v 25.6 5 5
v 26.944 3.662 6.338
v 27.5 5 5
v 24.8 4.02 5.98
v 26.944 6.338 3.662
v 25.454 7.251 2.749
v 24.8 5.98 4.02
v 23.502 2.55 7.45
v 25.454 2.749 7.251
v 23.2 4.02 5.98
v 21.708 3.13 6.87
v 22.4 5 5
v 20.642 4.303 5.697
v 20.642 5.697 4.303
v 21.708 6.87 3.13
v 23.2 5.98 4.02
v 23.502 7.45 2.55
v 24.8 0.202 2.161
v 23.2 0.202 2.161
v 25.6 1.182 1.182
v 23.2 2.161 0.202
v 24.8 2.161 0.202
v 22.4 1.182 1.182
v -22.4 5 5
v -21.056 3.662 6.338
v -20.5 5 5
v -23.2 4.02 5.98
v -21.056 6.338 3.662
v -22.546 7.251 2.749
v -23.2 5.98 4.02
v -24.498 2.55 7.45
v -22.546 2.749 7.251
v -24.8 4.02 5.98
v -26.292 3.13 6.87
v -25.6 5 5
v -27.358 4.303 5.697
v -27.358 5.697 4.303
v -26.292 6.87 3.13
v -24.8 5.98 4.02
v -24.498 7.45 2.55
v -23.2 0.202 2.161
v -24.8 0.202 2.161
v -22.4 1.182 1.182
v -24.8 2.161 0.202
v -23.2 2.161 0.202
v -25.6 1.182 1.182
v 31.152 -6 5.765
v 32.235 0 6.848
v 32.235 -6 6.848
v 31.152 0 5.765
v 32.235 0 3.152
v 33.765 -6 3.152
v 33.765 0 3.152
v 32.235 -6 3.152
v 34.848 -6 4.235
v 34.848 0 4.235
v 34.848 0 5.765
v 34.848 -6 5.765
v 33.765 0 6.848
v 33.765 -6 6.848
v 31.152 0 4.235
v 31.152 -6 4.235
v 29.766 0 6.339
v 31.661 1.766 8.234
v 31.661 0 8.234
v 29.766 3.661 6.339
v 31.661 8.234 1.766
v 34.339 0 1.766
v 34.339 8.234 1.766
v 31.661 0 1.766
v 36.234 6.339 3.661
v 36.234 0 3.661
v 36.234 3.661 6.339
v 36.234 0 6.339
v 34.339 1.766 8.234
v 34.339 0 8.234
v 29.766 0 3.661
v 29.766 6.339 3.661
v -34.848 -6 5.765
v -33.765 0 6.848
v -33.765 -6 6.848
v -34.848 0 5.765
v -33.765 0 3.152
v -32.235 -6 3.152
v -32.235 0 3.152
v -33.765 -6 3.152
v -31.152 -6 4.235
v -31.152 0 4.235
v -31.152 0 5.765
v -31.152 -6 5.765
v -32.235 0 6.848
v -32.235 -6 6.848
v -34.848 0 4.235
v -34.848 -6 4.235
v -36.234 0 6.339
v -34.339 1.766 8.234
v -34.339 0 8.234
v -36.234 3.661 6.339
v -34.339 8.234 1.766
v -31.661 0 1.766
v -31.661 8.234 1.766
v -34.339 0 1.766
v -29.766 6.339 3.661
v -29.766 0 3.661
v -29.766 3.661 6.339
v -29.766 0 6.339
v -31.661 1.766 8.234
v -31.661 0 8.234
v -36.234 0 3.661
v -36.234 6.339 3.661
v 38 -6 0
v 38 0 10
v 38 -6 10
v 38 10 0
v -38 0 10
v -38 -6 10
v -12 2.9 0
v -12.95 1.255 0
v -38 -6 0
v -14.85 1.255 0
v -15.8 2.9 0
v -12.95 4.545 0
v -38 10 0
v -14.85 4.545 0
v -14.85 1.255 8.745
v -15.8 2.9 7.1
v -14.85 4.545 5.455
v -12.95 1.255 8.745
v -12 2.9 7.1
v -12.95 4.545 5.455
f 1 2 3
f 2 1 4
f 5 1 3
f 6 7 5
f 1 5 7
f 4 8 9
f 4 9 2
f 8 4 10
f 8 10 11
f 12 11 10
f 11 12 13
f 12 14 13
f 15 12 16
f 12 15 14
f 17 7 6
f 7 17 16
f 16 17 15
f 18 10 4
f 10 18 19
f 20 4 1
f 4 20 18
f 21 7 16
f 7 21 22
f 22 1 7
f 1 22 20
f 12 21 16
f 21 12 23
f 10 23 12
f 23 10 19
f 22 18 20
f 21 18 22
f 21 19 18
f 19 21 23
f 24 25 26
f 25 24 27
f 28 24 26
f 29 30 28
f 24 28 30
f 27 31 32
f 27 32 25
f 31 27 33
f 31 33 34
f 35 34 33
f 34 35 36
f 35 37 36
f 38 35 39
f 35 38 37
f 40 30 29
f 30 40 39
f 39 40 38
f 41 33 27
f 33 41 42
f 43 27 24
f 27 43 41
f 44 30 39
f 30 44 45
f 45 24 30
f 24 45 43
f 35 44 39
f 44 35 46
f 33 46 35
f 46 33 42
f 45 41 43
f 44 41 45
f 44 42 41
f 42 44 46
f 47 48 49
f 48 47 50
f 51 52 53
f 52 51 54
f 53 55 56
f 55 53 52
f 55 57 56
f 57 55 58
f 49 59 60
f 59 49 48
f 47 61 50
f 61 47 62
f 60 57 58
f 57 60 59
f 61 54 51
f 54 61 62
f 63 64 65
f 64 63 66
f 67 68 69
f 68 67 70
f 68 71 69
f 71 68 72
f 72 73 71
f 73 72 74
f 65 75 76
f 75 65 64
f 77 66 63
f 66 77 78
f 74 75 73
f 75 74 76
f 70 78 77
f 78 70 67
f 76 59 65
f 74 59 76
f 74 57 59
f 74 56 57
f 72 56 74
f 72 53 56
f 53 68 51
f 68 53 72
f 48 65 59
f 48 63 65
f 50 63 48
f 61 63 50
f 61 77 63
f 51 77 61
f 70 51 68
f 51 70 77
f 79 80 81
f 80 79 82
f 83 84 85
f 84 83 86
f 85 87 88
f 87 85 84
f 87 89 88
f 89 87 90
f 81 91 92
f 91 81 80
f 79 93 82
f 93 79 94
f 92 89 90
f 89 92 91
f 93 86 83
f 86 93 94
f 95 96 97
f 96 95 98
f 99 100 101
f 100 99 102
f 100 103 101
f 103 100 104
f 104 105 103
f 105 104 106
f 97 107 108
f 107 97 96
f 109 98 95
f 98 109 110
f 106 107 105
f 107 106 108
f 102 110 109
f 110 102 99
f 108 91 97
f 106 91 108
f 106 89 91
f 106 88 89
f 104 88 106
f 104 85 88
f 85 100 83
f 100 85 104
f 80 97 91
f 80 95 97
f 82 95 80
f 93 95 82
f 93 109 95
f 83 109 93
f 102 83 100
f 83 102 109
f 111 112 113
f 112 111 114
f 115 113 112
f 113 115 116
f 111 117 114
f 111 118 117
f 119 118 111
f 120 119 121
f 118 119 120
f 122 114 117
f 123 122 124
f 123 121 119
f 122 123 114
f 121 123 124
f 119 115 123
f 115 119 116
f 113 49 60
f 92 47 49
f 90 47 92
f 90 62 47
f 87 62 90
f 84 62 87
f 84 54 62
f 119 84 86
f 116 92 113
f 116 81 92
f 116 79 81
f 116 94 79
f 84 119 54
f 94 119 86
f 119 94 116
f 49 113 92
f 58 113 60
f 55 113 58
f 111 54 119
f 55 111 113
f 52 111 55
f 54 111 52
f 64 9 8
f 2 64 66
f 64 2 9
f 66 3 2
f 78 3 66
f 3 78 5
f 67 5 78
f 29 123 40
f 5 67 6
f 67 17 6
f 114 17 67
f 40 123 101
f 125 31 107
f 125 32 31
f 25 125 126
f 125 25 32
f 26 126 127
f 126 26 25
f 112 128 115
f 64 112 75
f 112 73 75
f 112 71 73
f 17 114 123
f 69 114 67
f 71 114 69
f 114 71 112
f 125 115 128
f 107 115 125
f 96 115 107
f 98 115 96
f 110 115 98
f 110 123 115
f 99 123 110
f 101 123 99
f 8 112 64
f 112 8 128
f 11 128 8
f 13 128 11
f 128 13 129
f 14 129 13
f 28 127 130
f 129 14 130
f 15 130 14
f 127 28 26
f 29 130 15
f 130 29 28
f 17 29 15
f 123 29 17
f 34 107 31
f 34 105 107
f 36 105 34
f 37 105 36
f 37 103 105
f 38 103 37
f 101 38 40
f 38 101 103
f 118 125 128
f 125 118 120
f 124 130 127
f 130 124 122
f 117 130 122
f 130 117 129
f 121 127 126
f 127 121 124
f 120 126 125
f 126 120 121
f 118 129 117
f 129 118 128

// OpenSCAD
// Cheapskate Mount and Boom Jig
// by ScribbleJ - Originally by xnaron

// Overall dimensions of Cheapskate Mount
mount_length       = 76; // 
mount_height       = 10; // 
mount_width        = 6;  // Length of 'extra' behind the angle - total width is mount_width + mount_height.
ball_sep           = 48; // Separation distance of ball assemblies.
mount_bolt_sep     = 66; // Separation distance of Cheapskate mounting bolt holes.

// Dimensions of ball assembly parts
// TODO: Move this to separate file.
ball_dia          = 9.525;  // Diameter of ball bearing
ball_bolthead_dia = 5.4;    // Diameter of bolt head
ball_bolthead_l   = 3;      // Height of bolt head
ball_bolt_dia     = 3.2;    // Diameter of bolt shaft
ball_bolt_l       = 6;      // Length of bolt shaft
washer_dia        = 7;      // Diameter of washer
washer_h          = 0.6;    // Thickness of washer

// Dimensions of mounting bolts to attach to cheapskate
mount_bolthead_dia = 7;     // Diameter of bolt head
mount_bolt_dia     = 4;     // Diameter of bolt shaft

// Position and dimensions of long bolt for hitting endstops
endstop_bolt_dia   = 3.8;                      // Diameter of bolt shaft
endstop_bolt_x_off = -12 - endstop_bolt_dia/2; // X offset (from center)
endstop_bolt_y_off = 1 + mount_width + endstop_bolt_dia/2; // Y offset 

// Dimensions of Jig
jig_length       = 30; // 
jig_height       = 10; // 
jig_width        = 6;  // Length of 'extra' behind the angle - total width is mount_width + mount_height.
jig_nail_sep     = 20; // Separation distance of Cheapskate mounting bolt holes.
nail_dia         = 4;  // Diameter of nails for arm Jig

// Garbage Variables
huge = 200;


// The mount for the cheapskate carriages
cheapskate_mount();

// The parts for the arm-making Jig
// See the following URLs for use:
// http://www.flickr.com/photos/13723140@N04/8771948345/
// http://www.flickr.com/photos/13723140@N04/8771958335/
//
//jig_end();
//translate([0,0,mount_height+5]) rotate([180,0,0]) jig_stop();





module cheapskate_mount()
{
  difference()
  {
    translate([-mount_length/2,-mount_width,0]) cube([mount_length,mount_height+mount_width,mount_height]);

    // Angle cut
    translate([-huge/2,0,mount_height]) rotate([-45,0,0]) cube([huge,huge,huge]);

    // Ball Assembly
    #for(x=[ball_sep/2,-ball_sep/2])
      translate([x,0,0]) rotate([-45,0,0]) translate([0,0,(mount_height / sqrt(2))]) ball_assembly();

    // Mounting Bolts
    for(x=[mount_bolt_sep/2,-mount_bolt_sep/2])
      //translate([x,(mount_height - mount_bolthead_dia)/2,mount_height/2]) rotate([-90,90/4,0]) // Align with slope so bolthead has no overhang.
      translate([x,0,mount_height/2]) rotate([-90,90/4,0]) // Align with 'extra' portion
      {
        translate([0,0,-huge+1]) cylinder(r=mount_bolt_dia/2, h=huge, $fn=8);
        cylinder(r=mount_bolthead_dia/2, h=huge, $fn=8);
      }

    // Endstop bolt
    translate([endstop_bolt_x_off, endstop_bolt_y_off - mount_width, -1]) cylinder(r=endstop_bolt_dia/2, h=huge);
  }
}


module jig_end()
{
  difference()
  {
    translate([-jig_length/2,-jig_width,0]) cube([jig_length,jig_height+jig_width,jig_height]);

    // Angle cut
    translate([-huge/2,0,jig_height]) rotate([-45,0,0]) cube([huge,huge,huge]);

    // Ball Assembly
    #rotate([-45,0,0]) translate([0,0,(jig_height / sqrt(2))]) ball_assembly();

    // Mounting Nails
    for(x=[jig_nail_sep/2,-jig_nail_sep/2])
      translate([x,0,-1]) rotate([0,0,0])
      {
        cylinder(r=nail_dia/2, h=huge, $fn=8);
      }
  }
}

module jig_stop()
{
  difference()
  {

    translate([-5,-jig_width-5,0]) cube([jig_length, jig_height+jig_width+10, jig_height+5]);

    #translate([jig_length/2 + 5,-jig_width,-1]) cylinder(r=nail_dia/2,h=huge,$fn=8);
    #translate([jig_length/2 + 5,jig_width,-1]) cylinder(r=nail_dia/2,h=huge,$fn=8);

    translate([0,0,-0.05]) difference()
    {
      translate([-jig_length/2,-jig_width,0]) cube([jig_length,jig_height+jig_width,jig_height]);
      translate([-huge/2,0,jig_height]) rotate([-45,0,0]) cube([huge,huge,huge]);
    }
  }
}


// TODO: Adjust for depth of ball in hex on top of bolt.
//ball_assembly();
module ball_assembly()
{
  translate([0,0,ball_dia/2 + ball_bolthead_l + washer_h]) sphere(r=ball_dia/2);
  translate([0,0,washer_h]) cylinder(r=ball_bolthead_dia/2, h=ball_bolthead_l);
  cylinder(r=washer_dia/2,h=washer_h);
  translate([0,0,-ball_bolt_l+washer_h]) cylinder(r=ball_bolt_dia/2, h=ball_bolt_l+0.05);
}
